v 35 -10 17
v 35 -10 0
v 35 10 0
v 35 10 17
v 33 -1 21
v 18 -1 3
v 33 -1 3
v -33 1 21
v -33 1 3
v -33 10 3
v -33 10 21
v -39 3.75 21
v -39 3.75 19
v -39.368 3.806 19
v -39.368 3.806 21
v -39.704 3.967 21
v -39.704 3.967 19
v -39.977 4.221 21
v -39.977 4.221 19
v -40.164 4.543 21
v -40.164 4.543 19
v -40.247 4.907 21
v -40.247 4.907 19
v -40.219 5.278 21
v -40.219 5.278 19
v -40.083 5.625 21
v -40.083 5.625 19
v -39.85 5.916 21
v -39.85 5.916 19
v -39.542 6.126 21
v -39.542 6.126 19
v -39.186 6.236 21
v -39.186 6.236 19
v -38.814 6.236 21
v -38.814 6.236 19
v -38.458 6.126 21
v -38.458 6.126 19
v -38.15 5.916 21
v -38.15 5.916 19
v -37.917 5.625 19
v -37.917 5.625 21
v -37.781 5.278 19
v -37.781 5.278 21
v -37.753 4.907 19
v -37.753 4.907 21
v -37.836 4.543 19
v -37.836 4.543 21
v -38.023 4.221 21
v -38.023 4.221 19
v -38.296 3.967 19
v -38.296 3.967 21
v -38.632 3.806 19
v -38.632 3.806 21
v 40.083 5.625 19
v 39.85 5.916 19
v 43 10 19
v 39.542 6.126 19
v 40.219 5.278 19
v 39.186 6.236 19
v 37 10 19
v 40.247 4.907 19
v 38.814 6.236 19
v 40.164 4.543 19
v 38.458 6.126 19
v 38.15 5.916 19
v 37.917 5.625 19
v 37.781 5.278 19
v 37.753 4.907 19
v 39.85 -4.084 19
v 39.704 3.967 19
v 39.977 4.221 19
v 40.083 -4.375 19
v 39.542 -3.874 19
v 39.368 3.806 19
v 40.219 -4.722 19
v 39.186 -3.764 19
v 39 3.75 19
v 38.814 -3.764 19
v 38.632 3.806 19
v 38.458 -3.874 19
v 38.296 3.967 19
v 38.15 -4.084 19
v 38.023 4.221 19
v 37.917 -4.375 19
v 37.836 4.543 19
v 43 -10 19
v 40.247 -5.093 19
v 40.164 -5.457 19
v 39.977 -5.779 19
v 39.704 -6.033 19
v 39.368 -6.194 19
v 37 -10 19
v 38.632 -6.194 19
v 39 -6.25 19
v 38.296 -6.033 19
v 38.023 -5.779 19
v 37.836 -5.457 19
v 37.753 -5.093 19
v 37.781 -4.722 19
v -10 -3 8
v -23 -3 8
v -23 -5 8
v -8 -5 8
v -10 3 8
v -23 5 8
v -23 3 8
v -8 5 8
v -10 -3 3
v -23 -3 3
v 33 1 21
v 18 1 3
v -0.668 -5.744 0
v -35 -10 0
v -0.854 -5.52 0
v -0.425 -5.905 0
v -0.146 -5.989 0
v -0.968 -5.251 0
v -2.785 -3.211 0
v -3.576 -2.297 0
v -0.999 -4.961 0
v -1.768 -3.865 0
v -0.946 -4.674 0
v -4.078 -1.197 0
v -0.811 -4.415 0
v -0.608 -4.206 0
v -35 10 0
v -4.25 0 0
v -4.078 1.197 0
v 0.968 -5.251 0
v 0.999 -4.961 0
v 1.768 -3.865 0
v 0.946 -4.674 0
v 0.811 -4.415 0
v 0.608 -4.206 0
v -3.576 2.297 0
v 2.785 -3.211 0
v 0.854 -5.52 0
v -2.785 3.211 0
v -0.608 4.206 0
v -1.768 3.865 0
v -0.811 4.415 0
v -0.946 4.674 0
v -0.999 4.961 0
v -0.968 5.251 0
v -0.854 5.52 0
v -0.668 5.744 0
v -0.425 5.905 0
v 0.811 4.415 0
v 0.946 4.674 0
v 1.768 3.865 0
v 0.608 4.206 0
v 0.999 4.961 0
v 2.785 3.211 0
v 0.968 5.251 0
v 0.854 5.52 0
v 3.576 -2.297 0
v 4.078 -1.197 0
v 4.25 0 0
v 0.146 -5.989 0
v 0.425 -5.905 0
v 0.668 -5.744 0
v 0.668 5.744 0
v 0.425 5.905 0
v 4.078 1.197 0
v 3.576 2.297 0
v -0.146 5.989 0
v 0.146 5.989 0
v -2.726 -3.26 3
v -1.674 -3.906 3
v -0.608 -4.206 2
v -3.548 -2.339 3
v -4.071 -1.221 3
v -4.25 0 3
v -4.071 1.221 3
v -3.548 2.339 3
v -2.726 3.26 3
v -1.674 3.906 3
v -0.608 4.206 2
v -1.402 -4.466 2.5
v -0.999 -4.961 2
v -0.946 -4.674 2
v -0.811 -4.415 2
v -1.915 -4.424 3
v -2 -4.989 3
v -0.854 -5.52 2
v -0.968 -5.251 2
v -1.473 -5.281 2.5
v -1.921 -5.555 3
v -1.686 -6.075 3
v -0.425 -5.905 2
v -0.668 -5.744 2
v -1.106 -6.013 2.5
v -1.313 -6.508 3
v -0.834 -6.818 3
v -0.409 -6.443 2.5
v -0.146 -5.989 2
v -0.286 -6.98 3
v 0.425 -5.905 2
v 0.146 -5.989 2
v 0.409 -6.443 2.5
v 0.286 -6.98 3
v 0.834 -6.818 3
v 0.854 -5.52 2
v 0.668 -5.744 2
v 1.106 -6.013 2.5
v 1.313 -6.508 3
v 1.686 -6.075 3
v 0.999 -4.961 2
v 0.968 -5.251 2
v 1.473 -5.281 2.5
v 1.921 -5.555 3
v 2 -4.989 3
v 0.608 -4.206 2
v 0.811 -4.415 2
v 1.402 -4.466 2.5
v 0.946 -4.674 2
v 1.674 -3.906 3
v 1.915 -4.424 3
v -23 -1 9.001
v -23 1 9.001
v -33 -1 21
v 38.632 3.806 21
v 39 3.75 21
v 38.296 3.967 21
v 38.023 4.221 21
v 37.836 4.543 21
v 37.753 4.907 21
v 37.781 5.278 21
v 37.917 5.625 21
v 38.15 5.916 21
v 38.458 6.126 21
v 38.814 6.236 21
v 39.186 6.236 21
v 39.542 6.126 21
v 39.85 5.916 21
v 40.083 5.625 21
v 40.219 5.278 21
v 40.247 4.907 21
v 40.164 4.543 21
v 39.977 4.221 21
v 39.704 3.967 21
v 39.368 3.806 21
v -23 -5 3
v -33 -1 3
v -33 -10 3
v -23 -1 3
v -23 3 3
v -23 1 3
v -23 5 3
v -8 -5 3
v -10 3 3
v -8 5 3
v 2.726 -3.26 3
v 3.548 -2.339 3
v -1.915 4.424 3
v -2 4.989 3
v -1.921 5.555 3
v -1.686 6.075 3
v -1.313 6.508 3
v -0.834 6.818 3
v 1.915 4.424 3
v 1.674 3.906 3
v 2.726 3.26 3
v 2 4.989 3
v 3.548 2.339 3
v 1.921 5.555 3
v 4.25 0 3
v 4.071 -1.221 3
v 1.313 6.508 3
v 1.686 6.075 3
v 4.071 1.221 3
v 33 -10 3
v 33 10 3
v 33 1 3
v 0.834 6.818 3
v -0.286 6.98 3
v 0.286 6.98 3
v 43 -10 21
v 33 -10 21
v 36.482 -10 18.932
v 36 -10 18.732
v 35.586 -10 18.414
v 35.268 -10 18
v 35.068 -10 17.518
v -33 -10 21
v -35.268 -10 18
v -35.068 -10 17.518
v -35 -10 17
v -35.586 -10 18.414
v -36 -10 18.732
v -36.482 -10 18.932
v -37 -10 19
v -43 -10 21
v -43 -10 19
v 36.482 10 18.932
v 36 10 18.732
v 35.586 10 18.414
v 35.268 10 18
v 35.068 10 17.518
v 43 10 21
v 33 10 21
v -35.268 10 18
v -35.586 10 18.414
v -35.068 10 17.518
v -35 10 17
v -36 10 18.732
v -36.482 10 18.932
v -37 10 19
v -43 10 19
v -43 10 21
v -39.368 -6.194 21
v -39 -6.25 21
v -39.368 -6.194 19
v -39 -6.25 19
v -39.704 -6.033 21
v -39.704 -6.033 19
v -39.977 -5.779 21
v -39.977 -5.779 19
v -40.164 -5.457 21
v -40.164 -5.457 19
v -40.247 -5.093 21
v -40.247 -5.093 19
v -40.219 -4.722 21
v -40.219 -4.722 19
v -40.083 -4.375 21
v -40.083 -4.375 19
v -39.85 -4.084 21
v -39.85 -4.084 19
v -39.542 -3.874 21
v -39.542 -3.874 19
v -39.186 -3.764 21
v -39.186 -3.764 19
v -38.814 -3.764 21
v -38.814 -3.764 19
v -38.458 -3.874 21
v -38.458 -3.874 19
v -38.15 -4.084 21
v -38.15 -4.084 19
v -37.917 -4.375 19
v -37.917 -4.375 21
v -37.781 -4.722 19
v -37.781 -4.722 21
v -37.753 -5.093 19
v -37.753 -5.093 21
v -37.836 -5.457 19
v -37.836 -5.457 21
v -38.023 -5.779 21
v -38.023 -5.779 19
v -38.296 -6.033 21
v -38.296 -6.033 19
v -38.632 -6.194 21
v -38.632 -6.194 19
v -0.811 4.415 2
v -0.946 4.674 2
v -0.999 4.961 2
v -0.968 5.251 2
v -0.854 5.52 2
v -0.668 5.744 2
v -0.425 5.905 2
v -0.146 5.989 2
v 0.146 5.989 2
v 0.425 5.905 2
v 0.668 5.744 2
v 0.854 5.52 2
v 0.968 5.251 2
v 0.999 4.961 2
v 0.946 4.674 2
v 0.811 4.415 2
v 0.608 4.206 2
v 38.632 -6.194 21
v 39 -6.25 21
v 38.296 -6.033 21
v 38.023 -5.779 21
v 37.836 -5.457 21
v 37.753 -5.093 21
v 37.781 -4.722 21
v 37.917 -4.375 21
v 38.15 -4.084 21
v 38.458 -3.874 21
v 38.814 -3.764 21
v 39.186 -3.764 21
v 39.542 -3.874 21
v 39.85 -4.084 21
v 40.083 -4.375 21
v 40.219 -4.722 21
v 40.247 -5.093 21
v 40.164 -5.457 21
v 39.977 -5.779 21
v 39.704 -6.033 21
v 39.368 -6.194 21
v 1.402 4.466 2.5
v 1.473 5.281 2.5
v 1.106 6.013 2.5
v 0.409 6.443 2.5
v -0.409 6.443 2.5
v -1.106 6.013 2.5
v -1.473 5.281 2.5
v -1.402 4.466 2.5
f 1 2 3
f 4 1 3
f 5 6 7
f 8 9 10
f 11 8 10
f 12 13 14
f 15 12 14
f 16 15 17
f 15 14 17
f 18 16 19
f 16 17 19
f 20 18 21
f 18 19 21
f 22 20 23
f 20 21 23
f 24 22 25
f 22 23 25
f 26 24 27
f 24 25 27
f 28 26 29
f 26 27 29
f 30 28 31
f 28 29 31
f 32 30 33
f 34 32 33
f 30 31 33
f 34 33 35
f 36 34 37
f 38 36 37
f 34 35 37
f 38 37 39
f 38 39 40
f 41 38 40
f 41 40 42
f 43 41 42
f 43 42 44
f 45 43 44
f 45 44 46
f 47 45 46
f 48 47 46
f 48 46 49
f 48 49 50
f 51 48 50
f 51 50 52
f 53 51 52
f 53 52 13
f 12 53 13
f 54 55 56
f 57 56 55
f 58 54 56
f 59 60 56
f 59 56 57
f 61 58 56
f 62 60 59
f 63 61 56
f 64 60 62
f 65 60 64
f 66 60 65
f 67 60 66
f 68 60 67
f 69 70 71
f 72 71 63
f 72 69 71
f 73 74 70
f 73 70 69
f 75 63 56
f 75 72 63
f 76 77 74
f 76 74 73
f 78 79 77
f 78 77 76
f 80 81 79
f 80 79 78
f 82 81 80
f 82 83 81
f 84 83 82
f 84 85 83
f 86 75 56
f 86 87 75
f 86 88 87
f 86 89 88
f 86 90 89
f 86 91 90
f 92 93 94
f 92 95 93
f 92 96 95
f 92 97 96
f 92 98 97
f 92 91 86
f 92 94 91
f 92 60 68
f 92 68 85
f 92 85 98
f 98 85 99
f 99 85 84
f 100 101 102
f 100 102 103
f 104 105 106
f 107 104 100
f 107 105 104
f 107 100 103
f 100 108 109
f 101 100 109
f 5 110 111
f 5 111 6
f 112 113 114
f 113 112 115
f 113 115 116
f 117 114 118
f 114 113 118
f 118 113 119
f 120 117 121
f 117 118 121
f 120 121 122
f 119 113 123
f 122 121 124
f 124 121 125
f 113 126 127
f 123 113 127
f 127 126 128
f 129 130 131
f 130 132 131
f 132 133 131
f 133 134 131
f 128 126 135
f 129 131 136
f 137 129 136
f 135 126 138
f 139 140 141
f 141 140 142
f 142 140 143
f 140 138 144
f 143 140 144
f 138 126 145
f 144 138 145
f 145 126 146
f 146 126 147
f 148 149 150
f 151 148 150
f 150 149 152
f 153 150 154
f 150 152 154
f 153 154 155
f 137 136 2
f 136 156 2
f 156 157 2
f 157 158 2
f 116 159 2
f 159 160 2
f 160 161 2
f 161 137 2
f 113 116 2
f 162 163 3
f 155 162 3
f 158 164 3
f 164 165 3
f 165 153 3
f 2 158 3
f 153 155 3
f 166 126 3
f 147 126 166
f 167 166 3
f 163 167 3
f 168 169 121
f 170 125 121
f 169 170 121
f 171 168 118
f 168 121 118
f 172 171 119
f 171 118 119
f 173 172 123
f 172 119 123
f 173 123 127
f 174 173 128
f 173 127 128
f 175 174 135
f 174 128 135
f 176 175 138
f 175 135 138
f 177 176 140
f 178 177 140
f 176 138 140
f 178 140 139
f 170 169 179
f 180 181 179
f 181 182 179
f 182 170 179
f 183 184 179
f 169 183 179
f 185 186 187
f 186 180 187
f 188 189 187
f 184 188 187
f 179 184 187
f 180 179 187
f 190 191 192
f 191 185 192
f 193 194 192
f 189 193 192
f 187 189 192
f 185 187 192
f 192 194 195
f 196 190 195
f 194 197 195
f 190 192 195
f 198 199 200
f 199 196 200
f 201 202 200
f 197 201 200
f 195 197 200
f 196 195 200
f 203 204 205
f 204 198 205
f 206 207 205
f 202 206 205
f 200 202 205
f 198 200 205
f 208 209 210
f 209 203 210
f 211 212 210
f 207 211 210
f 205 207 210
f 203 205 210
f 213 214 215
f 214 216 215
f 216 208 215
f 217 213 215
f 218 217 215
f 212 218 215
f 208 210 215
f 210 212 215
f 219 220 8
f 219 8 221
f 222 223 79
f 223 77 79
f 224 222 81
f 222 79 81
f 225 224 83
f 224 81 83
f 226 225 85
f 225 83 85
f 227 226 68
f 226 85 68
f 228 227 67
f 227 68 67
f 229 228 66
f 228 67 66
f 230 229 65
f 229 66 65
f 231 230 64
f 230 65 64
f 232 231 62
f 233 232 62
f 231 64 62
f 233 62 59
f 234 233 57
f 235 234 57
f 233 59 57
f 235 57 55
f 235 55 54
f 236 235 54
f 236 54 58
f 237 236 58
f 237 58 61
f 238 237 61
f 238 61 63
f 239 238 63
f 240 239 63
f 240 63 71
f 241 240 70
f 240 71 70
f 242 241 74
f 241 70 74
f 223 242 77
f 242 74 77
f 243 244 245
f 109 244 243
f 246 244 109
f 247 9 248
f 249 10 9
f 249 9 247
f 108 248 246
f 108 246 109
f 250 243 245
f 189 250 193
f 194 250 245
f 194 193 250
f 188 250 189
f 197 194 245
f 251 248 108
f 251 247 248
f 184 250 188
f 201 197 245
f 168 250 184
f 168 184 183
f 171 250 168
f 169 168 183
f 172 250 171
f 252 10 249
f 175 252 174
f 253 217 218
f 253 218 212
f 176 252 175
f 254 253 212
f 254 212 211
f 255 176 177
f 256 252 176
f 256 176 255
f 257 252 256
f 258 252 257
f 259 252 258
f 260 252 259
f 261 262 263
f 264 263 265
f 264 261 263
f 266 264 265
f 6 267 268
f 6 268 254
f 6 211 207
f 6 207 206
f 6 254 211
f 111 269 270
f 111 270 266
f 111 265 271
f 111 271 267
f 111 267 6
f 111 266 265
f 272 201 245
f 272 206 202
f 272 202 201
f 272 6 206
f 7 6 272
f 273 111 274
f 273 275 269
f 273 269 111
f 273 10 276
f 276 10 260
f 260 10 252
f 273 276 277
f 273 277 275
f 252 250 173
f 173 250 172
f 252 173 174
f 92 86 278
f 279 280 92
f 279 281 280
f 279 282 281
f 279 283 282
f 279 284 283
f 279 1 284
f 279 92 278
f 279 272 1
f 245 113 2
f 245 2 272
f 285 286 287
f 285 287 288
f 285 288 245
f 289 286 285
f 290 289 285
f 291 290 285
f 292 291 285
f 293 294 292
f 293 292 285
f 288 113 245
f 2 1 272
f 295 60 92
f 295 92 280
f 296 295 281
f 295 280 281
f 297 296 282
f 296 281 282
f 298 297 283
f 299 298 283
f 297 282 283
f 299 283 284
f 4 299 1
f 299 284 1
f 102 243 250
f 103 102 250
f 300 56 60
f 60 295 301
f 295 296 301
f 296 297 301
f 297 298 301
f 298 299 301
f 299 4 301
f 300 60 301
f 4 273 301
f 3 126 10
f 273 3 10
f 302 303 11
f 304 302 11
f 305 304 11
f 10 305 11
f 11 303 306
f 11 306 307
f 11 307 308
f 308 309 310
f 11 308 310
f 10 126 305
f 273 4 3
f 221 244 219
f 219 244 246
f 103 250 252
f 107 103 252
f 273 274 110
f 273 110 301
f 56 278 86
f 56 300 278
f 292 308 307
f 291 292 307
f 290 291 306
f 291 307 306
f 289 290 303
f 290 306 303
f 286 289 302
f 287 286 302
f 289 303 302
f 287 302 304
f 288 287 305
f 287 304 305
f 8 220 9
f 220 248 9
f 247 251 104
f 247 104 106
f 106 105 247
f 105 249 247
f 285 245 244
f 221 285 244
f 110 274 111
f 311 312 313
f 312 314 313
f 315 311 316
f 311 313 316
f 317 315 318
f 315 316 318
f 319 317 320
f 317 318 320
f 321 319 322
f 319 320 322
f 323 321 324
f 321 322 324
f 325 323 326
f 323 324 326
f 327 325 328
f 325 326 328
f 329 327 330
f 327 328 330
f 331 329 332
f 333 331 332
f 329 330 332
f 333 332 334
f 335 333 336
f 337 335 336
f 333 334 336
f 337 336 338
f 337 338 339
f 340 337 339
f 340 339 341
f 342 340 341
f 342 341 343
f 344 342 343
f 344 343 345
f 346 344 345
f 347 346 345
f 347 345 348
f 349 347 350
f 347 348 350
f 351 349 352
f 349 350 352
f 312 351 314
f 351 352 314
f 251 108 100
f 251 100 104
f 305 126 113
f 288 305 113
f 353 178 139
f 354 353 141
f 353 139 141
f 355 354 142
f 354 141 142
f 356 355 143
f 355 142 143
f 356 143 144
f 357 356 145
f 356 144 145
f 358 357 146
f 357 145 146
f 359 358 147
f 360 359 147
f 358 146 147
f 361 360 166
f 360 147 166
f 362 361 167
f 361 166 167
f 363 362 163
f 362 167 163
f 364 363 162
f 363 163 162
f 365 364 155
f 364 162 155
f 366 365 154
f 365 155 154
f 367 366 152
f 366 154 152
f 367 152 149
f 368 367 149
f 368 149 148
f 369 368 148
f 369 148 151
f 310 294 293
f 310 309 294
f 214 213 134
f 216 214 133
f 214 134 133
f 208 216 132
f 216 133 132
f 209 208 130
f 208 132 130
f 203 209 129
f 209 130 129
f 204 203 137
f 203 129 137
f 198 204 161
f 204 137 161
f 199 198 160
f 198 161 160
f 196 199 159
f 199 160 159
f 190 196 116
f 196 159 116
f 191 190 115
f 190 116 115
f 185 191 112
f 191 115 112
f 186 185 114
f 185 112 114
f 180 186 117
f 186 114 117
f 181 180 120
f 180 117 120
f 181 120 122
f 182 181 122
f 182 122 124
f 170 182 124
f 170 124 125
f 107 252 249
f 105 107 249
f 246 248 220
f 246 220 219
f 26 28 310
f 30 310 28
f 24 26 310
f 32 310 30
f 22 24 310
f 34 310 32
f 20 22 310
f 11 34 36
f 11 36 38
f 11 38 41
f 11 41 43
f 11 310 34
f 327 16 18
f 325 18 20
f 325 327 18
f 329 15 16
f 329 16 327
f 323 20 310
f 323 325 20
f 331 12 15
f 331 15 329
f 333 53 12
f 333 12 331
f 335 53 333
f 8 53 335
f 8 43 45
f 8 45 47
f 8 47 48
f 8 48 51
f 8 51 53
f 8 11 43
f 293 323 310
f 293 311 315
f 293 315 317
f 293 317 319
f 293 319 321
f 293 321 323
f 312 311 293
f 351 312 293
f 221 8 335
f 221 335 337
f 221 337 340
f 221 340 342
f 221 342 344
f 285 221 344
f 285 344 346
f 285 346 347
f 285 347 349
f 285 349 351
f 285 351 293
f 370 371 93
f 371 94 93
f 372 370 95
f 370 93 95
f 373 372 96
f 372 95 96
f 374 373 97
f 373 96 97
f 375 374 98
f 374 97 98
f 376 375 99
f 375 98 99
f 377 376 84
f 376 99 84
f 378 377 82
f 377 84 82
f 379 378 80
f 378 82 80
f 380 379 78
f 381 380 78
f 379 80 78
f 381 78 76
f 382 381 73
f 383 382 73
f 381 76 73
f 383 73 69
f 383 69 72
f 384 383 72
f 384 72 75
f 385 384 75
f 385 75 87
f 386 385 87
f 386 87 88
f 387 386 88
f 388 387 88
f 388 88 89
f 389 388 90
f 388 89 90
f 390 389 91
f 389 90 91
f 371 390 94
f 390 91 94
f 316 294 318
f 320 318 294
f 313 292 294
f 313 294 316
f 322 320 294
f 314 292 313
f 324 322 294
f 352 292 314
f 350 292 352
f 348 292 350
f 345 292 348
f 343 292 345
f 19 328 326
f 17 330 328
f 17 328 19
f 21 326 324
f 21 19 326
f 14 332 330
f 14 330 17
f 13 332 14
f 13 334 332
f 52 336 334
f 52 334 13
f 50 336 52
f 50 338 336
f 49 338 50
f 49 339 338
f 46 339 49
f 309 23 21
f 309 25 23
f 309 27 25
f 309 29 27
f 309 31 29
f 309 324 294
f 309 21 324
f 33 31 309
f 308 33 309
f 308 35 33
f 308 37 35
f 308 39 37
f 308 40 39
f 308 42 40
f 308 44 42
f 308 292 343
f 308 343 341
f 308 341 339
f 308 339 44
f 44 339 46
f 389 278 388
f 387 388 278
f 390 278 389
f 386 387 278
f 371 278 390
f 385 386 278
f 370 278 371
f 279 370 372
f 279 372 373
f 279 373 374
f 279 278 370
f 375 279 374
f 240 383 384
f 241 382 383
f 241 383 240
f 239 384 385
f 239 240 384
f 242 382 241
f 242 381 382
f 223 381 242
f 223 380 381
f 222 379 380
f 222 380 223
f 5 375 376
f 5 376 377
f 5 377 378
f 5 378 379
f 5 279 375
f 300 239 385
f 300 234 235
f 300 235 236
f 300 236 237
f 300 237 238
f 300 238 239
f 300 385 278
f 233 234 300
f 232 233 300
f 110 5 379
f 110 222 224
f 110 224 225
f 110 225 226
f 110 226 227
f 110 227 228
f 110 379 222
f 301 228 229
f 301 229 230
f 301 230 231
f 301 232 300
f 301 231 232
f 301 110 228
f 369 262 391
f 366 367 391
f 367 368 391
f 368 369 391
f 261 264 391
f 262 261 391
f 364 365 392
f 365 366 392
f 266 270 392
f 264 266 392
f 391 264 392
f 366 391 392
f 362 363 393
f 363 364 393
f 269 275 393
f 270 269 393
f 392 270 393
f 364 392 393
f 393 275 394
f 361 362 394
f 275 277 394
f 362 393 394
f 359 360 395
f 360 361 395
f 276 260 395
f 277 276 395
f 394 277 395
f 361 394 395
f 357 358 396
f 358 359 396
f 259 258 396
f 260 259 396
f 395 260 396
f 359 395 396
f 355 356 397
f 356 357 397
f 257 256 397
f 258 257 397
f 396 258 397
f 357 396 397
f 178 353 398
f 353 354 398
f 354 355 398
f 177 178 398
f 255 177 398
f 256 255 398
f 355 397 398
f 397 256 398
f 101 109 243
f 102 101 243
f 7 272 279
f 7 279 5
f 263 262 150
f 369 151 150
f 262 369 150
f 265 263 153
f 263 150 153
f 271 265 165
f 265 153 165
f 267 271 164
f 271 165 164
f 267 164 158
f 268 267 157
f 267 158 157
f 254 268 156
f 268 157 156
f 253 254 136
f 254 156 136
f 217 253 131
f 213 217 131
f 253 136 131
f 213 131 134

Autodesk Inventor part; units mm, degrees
ref_plane "XZ Plane" through (0, 0, 0) normal (0, 1, 0) x (-1, 0, 0)
ref_plane "XY Plane" through (0, 0, 0) normal (0, 0, 1) x (1, 0, 0)
sketch "Boceto1" plane through (0, 0, 0) normal (0, 0, 1) x (1, 0, 0)
  circle A0 centre (0, 0) radius 4.25
  line L0 (-35, -10) -> (35, -10)
  line L1 (35, -10) -> (35, 10)
  line L2 (35, 10) -> (-35, 10)
  line L3 (-35, 10) -> (-35, -10)
  line L4 (-35, -10) -> (35, 10) construction
  line L5 (35, -10) -> (-35, 10) construction
  circle A1 centre (0, 0) radius 8
  dimension "d0" = 8.5
  dimension "d1" = 70
  dimension "d2" = 20
  dimension "d3" = 16
extrude "Extrusión1" add sketch "Boceto1" along normal blind 3 contours L3 L2 L1 L0 | A1
sketch "Boceto3" plane through (0, 0, 3) normal (0, 0, 1) x (1, 0, 0)
  line L0 (-35, 10) -> (-35, -10) projected
  line L1 (-35, -10) -> (-33, -10)
  line L2 (-33, -10) -> (-33, 10)
  line L3 (-33, 10) -> (-35, 10)
  line L4 (-35, 10) -> (-35, -10)
  line L5 (35, -10) -> (33, -10)
  line L6 (33, -10) -> (33, 10)
  line L7 (33, 10) -> (35, 10)
  line L8 (35, 10) -> (35, -10)
  point P0 (0, 0)
  dimension "d10" = 2
  dimension "d11" = 20
  dimension "d12" = 2
  dimension "d13" = 20
ref_plane "Plano de trabajo1" through (-48.5042, -32, 20) normal (0, 0, -1) x (0, 1, 0)
extrude "Extrusión3" add sketch "Boceto3" along normal blind 18
sketch "Boceto4" plane through (0, 0, 3) normal (0, 0, 1) x (1, 0, 0)
  circle A0 centre (0, 0) radius 4.25 projected
  circle A1 centre (0, -5) radius 1 projected
  circle A2 centre (0, 5) radius 1 projected
hole "Agujero1" at (0, -5, 3) at (0, 5, 3) direction (0, 0, -1) diameter 2 depth 3
chamfer "Chaflán1" distance 1 angle 45 2 edges at (0, -6, 3) (0, 6, 3)
sketch "Boceto5" plane through (-35, -10, 0) normal (-1, 0, 0) x (0, 0, 1)
  line L0 (0, 0) -> (21, 0) projected
  line L1 (21, 0) -> (19, 0)
  line L2 (19, 0) -> (19, 20)
  line L3 (19, 20) -> (21, 20)
  line L4 (21, 20) -> (21, 0)
  point P0 (0, 10)
  dimension "d49" = 2
  dimension "d50" = 20
extrude "Extrusión4" add sketch "Boceto5" along normal blind 8
sketch "Boceto6" plane through (35, -10, 0) normal (1, 0, 0) x (0, 0, -1)
  line L0 (0, 20) -> (-21, 20) projected
  line L1 (-21, 20) -> (-19, 20)
  line L2 (-19, 20) -> (-19, 0)
  line L3 (-19, 0) -> (-21, 0)
  line L4 (-21, 0) -> (-21, 20)
  point P0 (0, 10)
  dimension "d51" = 2
  dimension "d52" = 20
extrude "Extrusión5" add sketch "Boceto6" along normal blind 8
sketch "Boceto8" plane through (0, 0, 21) normal (0, 0, 1) x (1, 0, 0)
  line L0 (43, 10) -> (43, -10) projected
  line L1 (33, 10) -> (43, 10) projected
  line L2 (33, -10) -> (43, -10) projected
  point P0 (0, 0)
  point P1 (39, -5)
  point P2 (39, 5)
  dimension "d53" = 4
  dimension "d54" = 4
  dimension "d55" = 5
  dimension "d56" = 5
hole "Agujero3" at (39, 5, 21) at (39, -5, 21) direction (0, 0, -1) diameter 2.5 end through all
sketch "Boceto9" plane through (0, 0, 21) normal (0, 0, 1) x (1, 0, 0)
  line L0 (-33, 10) -> (-43, 10) projected
  line L1 (-43, -10) -> (-43, 10) projected
  line L2 (-33, -10) -> (-43, -10) projected
  point P0 (0, 0)
  point P1 (-39, 5)
  point P2 (-39, -5)
  dimension "d64" = 5
  dimension "d65" = 4
  dimension "d73" = 5
  dimension "d74" = 4
hole "Agujero4" at (-39, 5, 21) at (-39, -5, 21) direction (0, 0, -1) diameter 2.5 end through all
sketch "Boceto10" plane through (0, 0, 3) normal (0, 0, 1) x (1, 0, 0)
  line L0 (33, -10) -> (33, 10) projected
  line L1 (33, 0) -> (33, 1)
  line L2 (33, 0) -> (34, 0) construction
  line L3 (33, 1) -> (18, 1)
  line L4 (18, 1) -> (18, -1)
  line L5 (18, -1) -> (33, -1)
  line L6 (33, -1) -> (33, 1)
  point P0 (0, 0)
  dimension "d75" = 1
  dimension "d76" = 90
  dimension "d77" = 15
  dimension "d78" = 2
extrude "Extrusión6" add sketch "Boceto10" along normal blind 18
chamfer "Chaflán2" distance 15 distance2 18 1 edges at (18, 0, 21) measured on face at (42.0563, 1.5189, 21)
fillet "Empalme2" radius 2 2 edges at (35, 0, 19) (-35, 0, 19)
mirror "Simetría1" about plane through (0, 0, 0) normal (1, 0, 0) of "Extrusión6", "Chaflán2"
ref_plane "Plano de trabajo2" through (-10, 0, 0) normal (1, 0, 0) x (0, 1, 0)
sketch "Boceto12" plane through (0, 0, 3) normal (0, 0, 1) x (1, 0, 0)
  line L0 (-10, -3) -> (-21, -3) projected
  line L1 (-21, -3) -> (-21, 3) projected
  line L2 (-10, 3) -> (-21, 3) projected
  line L3 (-10, -3) -> (-10, 3) projected
  point P0 (0, 0)
extrude "Extrusión7" cut sketch "Boceto12" along normal blind 10
sketch "Boceto13" plane through (0, 0, 3) normal (0, 0, 1) x (1, 0, 0)
  line L0 (-10, -3) -> (-21, -3) projected
  line L1 (-21, -3) -> (-21, 3) projected
  line L2 (-10, 3) -> (-21, 3) projected
  line L3 (-10, -3) -> (-10, 3) projected
  line L4 (-23, -5) -> (-8, -5)
  line L5 (-8, -5) -> (-8, 5)
  line L6 (-8, 5) -> (-23, 5)
  line L7 (-23, 5) -> (-23, -5)
  line L8 (-10, -3) -> (-8, -3)
  line L9 (-10, 3) -> (-8, 3)
  line L10 (-33, -1) -> (-21, -1) projected
  line L11 (-21, 1) -> (-33, 1) projected
  line L12 (-21, -3) -> (-23, -3)
  line L13 (-21, 3) -> (-23, 3)
  point P0 (0, 0)
  point P1 (-23, 1)
  point P2 (-23, -1)
  dimension "d88" = 2
extrude "Extrusión8" add sketch "Boceto13" along normal blind 5 contours L8 L5 L4 L7 L12 L0 | L3 L9 L5 L8 | L2 L13 L7 L6 L5 L9 | L10 L7 L11 L1
sketch "Boceto14" plane through (0, 0, 8) normal (0, 0, 1) x (1, 0, 0)
  line L0 (-10, 3) -> (-23, 3) projected
  line L1 (-23, -3) -> (-10, -3) projected
  line L2 (-10, 3) -> (-23, 3)
  line L3 (-23, 3) -> (-23, -3)
  line L4 (-23, -3) -> (-10, -3)
  line L5 (-10, -3) -> (-10, 3)
  point P0 (0, 0)
extrude "Extrusión9" cut sketch "Boceto14" along normal blind 5 and the other way blind 5
properties part number "Soporte motor"
